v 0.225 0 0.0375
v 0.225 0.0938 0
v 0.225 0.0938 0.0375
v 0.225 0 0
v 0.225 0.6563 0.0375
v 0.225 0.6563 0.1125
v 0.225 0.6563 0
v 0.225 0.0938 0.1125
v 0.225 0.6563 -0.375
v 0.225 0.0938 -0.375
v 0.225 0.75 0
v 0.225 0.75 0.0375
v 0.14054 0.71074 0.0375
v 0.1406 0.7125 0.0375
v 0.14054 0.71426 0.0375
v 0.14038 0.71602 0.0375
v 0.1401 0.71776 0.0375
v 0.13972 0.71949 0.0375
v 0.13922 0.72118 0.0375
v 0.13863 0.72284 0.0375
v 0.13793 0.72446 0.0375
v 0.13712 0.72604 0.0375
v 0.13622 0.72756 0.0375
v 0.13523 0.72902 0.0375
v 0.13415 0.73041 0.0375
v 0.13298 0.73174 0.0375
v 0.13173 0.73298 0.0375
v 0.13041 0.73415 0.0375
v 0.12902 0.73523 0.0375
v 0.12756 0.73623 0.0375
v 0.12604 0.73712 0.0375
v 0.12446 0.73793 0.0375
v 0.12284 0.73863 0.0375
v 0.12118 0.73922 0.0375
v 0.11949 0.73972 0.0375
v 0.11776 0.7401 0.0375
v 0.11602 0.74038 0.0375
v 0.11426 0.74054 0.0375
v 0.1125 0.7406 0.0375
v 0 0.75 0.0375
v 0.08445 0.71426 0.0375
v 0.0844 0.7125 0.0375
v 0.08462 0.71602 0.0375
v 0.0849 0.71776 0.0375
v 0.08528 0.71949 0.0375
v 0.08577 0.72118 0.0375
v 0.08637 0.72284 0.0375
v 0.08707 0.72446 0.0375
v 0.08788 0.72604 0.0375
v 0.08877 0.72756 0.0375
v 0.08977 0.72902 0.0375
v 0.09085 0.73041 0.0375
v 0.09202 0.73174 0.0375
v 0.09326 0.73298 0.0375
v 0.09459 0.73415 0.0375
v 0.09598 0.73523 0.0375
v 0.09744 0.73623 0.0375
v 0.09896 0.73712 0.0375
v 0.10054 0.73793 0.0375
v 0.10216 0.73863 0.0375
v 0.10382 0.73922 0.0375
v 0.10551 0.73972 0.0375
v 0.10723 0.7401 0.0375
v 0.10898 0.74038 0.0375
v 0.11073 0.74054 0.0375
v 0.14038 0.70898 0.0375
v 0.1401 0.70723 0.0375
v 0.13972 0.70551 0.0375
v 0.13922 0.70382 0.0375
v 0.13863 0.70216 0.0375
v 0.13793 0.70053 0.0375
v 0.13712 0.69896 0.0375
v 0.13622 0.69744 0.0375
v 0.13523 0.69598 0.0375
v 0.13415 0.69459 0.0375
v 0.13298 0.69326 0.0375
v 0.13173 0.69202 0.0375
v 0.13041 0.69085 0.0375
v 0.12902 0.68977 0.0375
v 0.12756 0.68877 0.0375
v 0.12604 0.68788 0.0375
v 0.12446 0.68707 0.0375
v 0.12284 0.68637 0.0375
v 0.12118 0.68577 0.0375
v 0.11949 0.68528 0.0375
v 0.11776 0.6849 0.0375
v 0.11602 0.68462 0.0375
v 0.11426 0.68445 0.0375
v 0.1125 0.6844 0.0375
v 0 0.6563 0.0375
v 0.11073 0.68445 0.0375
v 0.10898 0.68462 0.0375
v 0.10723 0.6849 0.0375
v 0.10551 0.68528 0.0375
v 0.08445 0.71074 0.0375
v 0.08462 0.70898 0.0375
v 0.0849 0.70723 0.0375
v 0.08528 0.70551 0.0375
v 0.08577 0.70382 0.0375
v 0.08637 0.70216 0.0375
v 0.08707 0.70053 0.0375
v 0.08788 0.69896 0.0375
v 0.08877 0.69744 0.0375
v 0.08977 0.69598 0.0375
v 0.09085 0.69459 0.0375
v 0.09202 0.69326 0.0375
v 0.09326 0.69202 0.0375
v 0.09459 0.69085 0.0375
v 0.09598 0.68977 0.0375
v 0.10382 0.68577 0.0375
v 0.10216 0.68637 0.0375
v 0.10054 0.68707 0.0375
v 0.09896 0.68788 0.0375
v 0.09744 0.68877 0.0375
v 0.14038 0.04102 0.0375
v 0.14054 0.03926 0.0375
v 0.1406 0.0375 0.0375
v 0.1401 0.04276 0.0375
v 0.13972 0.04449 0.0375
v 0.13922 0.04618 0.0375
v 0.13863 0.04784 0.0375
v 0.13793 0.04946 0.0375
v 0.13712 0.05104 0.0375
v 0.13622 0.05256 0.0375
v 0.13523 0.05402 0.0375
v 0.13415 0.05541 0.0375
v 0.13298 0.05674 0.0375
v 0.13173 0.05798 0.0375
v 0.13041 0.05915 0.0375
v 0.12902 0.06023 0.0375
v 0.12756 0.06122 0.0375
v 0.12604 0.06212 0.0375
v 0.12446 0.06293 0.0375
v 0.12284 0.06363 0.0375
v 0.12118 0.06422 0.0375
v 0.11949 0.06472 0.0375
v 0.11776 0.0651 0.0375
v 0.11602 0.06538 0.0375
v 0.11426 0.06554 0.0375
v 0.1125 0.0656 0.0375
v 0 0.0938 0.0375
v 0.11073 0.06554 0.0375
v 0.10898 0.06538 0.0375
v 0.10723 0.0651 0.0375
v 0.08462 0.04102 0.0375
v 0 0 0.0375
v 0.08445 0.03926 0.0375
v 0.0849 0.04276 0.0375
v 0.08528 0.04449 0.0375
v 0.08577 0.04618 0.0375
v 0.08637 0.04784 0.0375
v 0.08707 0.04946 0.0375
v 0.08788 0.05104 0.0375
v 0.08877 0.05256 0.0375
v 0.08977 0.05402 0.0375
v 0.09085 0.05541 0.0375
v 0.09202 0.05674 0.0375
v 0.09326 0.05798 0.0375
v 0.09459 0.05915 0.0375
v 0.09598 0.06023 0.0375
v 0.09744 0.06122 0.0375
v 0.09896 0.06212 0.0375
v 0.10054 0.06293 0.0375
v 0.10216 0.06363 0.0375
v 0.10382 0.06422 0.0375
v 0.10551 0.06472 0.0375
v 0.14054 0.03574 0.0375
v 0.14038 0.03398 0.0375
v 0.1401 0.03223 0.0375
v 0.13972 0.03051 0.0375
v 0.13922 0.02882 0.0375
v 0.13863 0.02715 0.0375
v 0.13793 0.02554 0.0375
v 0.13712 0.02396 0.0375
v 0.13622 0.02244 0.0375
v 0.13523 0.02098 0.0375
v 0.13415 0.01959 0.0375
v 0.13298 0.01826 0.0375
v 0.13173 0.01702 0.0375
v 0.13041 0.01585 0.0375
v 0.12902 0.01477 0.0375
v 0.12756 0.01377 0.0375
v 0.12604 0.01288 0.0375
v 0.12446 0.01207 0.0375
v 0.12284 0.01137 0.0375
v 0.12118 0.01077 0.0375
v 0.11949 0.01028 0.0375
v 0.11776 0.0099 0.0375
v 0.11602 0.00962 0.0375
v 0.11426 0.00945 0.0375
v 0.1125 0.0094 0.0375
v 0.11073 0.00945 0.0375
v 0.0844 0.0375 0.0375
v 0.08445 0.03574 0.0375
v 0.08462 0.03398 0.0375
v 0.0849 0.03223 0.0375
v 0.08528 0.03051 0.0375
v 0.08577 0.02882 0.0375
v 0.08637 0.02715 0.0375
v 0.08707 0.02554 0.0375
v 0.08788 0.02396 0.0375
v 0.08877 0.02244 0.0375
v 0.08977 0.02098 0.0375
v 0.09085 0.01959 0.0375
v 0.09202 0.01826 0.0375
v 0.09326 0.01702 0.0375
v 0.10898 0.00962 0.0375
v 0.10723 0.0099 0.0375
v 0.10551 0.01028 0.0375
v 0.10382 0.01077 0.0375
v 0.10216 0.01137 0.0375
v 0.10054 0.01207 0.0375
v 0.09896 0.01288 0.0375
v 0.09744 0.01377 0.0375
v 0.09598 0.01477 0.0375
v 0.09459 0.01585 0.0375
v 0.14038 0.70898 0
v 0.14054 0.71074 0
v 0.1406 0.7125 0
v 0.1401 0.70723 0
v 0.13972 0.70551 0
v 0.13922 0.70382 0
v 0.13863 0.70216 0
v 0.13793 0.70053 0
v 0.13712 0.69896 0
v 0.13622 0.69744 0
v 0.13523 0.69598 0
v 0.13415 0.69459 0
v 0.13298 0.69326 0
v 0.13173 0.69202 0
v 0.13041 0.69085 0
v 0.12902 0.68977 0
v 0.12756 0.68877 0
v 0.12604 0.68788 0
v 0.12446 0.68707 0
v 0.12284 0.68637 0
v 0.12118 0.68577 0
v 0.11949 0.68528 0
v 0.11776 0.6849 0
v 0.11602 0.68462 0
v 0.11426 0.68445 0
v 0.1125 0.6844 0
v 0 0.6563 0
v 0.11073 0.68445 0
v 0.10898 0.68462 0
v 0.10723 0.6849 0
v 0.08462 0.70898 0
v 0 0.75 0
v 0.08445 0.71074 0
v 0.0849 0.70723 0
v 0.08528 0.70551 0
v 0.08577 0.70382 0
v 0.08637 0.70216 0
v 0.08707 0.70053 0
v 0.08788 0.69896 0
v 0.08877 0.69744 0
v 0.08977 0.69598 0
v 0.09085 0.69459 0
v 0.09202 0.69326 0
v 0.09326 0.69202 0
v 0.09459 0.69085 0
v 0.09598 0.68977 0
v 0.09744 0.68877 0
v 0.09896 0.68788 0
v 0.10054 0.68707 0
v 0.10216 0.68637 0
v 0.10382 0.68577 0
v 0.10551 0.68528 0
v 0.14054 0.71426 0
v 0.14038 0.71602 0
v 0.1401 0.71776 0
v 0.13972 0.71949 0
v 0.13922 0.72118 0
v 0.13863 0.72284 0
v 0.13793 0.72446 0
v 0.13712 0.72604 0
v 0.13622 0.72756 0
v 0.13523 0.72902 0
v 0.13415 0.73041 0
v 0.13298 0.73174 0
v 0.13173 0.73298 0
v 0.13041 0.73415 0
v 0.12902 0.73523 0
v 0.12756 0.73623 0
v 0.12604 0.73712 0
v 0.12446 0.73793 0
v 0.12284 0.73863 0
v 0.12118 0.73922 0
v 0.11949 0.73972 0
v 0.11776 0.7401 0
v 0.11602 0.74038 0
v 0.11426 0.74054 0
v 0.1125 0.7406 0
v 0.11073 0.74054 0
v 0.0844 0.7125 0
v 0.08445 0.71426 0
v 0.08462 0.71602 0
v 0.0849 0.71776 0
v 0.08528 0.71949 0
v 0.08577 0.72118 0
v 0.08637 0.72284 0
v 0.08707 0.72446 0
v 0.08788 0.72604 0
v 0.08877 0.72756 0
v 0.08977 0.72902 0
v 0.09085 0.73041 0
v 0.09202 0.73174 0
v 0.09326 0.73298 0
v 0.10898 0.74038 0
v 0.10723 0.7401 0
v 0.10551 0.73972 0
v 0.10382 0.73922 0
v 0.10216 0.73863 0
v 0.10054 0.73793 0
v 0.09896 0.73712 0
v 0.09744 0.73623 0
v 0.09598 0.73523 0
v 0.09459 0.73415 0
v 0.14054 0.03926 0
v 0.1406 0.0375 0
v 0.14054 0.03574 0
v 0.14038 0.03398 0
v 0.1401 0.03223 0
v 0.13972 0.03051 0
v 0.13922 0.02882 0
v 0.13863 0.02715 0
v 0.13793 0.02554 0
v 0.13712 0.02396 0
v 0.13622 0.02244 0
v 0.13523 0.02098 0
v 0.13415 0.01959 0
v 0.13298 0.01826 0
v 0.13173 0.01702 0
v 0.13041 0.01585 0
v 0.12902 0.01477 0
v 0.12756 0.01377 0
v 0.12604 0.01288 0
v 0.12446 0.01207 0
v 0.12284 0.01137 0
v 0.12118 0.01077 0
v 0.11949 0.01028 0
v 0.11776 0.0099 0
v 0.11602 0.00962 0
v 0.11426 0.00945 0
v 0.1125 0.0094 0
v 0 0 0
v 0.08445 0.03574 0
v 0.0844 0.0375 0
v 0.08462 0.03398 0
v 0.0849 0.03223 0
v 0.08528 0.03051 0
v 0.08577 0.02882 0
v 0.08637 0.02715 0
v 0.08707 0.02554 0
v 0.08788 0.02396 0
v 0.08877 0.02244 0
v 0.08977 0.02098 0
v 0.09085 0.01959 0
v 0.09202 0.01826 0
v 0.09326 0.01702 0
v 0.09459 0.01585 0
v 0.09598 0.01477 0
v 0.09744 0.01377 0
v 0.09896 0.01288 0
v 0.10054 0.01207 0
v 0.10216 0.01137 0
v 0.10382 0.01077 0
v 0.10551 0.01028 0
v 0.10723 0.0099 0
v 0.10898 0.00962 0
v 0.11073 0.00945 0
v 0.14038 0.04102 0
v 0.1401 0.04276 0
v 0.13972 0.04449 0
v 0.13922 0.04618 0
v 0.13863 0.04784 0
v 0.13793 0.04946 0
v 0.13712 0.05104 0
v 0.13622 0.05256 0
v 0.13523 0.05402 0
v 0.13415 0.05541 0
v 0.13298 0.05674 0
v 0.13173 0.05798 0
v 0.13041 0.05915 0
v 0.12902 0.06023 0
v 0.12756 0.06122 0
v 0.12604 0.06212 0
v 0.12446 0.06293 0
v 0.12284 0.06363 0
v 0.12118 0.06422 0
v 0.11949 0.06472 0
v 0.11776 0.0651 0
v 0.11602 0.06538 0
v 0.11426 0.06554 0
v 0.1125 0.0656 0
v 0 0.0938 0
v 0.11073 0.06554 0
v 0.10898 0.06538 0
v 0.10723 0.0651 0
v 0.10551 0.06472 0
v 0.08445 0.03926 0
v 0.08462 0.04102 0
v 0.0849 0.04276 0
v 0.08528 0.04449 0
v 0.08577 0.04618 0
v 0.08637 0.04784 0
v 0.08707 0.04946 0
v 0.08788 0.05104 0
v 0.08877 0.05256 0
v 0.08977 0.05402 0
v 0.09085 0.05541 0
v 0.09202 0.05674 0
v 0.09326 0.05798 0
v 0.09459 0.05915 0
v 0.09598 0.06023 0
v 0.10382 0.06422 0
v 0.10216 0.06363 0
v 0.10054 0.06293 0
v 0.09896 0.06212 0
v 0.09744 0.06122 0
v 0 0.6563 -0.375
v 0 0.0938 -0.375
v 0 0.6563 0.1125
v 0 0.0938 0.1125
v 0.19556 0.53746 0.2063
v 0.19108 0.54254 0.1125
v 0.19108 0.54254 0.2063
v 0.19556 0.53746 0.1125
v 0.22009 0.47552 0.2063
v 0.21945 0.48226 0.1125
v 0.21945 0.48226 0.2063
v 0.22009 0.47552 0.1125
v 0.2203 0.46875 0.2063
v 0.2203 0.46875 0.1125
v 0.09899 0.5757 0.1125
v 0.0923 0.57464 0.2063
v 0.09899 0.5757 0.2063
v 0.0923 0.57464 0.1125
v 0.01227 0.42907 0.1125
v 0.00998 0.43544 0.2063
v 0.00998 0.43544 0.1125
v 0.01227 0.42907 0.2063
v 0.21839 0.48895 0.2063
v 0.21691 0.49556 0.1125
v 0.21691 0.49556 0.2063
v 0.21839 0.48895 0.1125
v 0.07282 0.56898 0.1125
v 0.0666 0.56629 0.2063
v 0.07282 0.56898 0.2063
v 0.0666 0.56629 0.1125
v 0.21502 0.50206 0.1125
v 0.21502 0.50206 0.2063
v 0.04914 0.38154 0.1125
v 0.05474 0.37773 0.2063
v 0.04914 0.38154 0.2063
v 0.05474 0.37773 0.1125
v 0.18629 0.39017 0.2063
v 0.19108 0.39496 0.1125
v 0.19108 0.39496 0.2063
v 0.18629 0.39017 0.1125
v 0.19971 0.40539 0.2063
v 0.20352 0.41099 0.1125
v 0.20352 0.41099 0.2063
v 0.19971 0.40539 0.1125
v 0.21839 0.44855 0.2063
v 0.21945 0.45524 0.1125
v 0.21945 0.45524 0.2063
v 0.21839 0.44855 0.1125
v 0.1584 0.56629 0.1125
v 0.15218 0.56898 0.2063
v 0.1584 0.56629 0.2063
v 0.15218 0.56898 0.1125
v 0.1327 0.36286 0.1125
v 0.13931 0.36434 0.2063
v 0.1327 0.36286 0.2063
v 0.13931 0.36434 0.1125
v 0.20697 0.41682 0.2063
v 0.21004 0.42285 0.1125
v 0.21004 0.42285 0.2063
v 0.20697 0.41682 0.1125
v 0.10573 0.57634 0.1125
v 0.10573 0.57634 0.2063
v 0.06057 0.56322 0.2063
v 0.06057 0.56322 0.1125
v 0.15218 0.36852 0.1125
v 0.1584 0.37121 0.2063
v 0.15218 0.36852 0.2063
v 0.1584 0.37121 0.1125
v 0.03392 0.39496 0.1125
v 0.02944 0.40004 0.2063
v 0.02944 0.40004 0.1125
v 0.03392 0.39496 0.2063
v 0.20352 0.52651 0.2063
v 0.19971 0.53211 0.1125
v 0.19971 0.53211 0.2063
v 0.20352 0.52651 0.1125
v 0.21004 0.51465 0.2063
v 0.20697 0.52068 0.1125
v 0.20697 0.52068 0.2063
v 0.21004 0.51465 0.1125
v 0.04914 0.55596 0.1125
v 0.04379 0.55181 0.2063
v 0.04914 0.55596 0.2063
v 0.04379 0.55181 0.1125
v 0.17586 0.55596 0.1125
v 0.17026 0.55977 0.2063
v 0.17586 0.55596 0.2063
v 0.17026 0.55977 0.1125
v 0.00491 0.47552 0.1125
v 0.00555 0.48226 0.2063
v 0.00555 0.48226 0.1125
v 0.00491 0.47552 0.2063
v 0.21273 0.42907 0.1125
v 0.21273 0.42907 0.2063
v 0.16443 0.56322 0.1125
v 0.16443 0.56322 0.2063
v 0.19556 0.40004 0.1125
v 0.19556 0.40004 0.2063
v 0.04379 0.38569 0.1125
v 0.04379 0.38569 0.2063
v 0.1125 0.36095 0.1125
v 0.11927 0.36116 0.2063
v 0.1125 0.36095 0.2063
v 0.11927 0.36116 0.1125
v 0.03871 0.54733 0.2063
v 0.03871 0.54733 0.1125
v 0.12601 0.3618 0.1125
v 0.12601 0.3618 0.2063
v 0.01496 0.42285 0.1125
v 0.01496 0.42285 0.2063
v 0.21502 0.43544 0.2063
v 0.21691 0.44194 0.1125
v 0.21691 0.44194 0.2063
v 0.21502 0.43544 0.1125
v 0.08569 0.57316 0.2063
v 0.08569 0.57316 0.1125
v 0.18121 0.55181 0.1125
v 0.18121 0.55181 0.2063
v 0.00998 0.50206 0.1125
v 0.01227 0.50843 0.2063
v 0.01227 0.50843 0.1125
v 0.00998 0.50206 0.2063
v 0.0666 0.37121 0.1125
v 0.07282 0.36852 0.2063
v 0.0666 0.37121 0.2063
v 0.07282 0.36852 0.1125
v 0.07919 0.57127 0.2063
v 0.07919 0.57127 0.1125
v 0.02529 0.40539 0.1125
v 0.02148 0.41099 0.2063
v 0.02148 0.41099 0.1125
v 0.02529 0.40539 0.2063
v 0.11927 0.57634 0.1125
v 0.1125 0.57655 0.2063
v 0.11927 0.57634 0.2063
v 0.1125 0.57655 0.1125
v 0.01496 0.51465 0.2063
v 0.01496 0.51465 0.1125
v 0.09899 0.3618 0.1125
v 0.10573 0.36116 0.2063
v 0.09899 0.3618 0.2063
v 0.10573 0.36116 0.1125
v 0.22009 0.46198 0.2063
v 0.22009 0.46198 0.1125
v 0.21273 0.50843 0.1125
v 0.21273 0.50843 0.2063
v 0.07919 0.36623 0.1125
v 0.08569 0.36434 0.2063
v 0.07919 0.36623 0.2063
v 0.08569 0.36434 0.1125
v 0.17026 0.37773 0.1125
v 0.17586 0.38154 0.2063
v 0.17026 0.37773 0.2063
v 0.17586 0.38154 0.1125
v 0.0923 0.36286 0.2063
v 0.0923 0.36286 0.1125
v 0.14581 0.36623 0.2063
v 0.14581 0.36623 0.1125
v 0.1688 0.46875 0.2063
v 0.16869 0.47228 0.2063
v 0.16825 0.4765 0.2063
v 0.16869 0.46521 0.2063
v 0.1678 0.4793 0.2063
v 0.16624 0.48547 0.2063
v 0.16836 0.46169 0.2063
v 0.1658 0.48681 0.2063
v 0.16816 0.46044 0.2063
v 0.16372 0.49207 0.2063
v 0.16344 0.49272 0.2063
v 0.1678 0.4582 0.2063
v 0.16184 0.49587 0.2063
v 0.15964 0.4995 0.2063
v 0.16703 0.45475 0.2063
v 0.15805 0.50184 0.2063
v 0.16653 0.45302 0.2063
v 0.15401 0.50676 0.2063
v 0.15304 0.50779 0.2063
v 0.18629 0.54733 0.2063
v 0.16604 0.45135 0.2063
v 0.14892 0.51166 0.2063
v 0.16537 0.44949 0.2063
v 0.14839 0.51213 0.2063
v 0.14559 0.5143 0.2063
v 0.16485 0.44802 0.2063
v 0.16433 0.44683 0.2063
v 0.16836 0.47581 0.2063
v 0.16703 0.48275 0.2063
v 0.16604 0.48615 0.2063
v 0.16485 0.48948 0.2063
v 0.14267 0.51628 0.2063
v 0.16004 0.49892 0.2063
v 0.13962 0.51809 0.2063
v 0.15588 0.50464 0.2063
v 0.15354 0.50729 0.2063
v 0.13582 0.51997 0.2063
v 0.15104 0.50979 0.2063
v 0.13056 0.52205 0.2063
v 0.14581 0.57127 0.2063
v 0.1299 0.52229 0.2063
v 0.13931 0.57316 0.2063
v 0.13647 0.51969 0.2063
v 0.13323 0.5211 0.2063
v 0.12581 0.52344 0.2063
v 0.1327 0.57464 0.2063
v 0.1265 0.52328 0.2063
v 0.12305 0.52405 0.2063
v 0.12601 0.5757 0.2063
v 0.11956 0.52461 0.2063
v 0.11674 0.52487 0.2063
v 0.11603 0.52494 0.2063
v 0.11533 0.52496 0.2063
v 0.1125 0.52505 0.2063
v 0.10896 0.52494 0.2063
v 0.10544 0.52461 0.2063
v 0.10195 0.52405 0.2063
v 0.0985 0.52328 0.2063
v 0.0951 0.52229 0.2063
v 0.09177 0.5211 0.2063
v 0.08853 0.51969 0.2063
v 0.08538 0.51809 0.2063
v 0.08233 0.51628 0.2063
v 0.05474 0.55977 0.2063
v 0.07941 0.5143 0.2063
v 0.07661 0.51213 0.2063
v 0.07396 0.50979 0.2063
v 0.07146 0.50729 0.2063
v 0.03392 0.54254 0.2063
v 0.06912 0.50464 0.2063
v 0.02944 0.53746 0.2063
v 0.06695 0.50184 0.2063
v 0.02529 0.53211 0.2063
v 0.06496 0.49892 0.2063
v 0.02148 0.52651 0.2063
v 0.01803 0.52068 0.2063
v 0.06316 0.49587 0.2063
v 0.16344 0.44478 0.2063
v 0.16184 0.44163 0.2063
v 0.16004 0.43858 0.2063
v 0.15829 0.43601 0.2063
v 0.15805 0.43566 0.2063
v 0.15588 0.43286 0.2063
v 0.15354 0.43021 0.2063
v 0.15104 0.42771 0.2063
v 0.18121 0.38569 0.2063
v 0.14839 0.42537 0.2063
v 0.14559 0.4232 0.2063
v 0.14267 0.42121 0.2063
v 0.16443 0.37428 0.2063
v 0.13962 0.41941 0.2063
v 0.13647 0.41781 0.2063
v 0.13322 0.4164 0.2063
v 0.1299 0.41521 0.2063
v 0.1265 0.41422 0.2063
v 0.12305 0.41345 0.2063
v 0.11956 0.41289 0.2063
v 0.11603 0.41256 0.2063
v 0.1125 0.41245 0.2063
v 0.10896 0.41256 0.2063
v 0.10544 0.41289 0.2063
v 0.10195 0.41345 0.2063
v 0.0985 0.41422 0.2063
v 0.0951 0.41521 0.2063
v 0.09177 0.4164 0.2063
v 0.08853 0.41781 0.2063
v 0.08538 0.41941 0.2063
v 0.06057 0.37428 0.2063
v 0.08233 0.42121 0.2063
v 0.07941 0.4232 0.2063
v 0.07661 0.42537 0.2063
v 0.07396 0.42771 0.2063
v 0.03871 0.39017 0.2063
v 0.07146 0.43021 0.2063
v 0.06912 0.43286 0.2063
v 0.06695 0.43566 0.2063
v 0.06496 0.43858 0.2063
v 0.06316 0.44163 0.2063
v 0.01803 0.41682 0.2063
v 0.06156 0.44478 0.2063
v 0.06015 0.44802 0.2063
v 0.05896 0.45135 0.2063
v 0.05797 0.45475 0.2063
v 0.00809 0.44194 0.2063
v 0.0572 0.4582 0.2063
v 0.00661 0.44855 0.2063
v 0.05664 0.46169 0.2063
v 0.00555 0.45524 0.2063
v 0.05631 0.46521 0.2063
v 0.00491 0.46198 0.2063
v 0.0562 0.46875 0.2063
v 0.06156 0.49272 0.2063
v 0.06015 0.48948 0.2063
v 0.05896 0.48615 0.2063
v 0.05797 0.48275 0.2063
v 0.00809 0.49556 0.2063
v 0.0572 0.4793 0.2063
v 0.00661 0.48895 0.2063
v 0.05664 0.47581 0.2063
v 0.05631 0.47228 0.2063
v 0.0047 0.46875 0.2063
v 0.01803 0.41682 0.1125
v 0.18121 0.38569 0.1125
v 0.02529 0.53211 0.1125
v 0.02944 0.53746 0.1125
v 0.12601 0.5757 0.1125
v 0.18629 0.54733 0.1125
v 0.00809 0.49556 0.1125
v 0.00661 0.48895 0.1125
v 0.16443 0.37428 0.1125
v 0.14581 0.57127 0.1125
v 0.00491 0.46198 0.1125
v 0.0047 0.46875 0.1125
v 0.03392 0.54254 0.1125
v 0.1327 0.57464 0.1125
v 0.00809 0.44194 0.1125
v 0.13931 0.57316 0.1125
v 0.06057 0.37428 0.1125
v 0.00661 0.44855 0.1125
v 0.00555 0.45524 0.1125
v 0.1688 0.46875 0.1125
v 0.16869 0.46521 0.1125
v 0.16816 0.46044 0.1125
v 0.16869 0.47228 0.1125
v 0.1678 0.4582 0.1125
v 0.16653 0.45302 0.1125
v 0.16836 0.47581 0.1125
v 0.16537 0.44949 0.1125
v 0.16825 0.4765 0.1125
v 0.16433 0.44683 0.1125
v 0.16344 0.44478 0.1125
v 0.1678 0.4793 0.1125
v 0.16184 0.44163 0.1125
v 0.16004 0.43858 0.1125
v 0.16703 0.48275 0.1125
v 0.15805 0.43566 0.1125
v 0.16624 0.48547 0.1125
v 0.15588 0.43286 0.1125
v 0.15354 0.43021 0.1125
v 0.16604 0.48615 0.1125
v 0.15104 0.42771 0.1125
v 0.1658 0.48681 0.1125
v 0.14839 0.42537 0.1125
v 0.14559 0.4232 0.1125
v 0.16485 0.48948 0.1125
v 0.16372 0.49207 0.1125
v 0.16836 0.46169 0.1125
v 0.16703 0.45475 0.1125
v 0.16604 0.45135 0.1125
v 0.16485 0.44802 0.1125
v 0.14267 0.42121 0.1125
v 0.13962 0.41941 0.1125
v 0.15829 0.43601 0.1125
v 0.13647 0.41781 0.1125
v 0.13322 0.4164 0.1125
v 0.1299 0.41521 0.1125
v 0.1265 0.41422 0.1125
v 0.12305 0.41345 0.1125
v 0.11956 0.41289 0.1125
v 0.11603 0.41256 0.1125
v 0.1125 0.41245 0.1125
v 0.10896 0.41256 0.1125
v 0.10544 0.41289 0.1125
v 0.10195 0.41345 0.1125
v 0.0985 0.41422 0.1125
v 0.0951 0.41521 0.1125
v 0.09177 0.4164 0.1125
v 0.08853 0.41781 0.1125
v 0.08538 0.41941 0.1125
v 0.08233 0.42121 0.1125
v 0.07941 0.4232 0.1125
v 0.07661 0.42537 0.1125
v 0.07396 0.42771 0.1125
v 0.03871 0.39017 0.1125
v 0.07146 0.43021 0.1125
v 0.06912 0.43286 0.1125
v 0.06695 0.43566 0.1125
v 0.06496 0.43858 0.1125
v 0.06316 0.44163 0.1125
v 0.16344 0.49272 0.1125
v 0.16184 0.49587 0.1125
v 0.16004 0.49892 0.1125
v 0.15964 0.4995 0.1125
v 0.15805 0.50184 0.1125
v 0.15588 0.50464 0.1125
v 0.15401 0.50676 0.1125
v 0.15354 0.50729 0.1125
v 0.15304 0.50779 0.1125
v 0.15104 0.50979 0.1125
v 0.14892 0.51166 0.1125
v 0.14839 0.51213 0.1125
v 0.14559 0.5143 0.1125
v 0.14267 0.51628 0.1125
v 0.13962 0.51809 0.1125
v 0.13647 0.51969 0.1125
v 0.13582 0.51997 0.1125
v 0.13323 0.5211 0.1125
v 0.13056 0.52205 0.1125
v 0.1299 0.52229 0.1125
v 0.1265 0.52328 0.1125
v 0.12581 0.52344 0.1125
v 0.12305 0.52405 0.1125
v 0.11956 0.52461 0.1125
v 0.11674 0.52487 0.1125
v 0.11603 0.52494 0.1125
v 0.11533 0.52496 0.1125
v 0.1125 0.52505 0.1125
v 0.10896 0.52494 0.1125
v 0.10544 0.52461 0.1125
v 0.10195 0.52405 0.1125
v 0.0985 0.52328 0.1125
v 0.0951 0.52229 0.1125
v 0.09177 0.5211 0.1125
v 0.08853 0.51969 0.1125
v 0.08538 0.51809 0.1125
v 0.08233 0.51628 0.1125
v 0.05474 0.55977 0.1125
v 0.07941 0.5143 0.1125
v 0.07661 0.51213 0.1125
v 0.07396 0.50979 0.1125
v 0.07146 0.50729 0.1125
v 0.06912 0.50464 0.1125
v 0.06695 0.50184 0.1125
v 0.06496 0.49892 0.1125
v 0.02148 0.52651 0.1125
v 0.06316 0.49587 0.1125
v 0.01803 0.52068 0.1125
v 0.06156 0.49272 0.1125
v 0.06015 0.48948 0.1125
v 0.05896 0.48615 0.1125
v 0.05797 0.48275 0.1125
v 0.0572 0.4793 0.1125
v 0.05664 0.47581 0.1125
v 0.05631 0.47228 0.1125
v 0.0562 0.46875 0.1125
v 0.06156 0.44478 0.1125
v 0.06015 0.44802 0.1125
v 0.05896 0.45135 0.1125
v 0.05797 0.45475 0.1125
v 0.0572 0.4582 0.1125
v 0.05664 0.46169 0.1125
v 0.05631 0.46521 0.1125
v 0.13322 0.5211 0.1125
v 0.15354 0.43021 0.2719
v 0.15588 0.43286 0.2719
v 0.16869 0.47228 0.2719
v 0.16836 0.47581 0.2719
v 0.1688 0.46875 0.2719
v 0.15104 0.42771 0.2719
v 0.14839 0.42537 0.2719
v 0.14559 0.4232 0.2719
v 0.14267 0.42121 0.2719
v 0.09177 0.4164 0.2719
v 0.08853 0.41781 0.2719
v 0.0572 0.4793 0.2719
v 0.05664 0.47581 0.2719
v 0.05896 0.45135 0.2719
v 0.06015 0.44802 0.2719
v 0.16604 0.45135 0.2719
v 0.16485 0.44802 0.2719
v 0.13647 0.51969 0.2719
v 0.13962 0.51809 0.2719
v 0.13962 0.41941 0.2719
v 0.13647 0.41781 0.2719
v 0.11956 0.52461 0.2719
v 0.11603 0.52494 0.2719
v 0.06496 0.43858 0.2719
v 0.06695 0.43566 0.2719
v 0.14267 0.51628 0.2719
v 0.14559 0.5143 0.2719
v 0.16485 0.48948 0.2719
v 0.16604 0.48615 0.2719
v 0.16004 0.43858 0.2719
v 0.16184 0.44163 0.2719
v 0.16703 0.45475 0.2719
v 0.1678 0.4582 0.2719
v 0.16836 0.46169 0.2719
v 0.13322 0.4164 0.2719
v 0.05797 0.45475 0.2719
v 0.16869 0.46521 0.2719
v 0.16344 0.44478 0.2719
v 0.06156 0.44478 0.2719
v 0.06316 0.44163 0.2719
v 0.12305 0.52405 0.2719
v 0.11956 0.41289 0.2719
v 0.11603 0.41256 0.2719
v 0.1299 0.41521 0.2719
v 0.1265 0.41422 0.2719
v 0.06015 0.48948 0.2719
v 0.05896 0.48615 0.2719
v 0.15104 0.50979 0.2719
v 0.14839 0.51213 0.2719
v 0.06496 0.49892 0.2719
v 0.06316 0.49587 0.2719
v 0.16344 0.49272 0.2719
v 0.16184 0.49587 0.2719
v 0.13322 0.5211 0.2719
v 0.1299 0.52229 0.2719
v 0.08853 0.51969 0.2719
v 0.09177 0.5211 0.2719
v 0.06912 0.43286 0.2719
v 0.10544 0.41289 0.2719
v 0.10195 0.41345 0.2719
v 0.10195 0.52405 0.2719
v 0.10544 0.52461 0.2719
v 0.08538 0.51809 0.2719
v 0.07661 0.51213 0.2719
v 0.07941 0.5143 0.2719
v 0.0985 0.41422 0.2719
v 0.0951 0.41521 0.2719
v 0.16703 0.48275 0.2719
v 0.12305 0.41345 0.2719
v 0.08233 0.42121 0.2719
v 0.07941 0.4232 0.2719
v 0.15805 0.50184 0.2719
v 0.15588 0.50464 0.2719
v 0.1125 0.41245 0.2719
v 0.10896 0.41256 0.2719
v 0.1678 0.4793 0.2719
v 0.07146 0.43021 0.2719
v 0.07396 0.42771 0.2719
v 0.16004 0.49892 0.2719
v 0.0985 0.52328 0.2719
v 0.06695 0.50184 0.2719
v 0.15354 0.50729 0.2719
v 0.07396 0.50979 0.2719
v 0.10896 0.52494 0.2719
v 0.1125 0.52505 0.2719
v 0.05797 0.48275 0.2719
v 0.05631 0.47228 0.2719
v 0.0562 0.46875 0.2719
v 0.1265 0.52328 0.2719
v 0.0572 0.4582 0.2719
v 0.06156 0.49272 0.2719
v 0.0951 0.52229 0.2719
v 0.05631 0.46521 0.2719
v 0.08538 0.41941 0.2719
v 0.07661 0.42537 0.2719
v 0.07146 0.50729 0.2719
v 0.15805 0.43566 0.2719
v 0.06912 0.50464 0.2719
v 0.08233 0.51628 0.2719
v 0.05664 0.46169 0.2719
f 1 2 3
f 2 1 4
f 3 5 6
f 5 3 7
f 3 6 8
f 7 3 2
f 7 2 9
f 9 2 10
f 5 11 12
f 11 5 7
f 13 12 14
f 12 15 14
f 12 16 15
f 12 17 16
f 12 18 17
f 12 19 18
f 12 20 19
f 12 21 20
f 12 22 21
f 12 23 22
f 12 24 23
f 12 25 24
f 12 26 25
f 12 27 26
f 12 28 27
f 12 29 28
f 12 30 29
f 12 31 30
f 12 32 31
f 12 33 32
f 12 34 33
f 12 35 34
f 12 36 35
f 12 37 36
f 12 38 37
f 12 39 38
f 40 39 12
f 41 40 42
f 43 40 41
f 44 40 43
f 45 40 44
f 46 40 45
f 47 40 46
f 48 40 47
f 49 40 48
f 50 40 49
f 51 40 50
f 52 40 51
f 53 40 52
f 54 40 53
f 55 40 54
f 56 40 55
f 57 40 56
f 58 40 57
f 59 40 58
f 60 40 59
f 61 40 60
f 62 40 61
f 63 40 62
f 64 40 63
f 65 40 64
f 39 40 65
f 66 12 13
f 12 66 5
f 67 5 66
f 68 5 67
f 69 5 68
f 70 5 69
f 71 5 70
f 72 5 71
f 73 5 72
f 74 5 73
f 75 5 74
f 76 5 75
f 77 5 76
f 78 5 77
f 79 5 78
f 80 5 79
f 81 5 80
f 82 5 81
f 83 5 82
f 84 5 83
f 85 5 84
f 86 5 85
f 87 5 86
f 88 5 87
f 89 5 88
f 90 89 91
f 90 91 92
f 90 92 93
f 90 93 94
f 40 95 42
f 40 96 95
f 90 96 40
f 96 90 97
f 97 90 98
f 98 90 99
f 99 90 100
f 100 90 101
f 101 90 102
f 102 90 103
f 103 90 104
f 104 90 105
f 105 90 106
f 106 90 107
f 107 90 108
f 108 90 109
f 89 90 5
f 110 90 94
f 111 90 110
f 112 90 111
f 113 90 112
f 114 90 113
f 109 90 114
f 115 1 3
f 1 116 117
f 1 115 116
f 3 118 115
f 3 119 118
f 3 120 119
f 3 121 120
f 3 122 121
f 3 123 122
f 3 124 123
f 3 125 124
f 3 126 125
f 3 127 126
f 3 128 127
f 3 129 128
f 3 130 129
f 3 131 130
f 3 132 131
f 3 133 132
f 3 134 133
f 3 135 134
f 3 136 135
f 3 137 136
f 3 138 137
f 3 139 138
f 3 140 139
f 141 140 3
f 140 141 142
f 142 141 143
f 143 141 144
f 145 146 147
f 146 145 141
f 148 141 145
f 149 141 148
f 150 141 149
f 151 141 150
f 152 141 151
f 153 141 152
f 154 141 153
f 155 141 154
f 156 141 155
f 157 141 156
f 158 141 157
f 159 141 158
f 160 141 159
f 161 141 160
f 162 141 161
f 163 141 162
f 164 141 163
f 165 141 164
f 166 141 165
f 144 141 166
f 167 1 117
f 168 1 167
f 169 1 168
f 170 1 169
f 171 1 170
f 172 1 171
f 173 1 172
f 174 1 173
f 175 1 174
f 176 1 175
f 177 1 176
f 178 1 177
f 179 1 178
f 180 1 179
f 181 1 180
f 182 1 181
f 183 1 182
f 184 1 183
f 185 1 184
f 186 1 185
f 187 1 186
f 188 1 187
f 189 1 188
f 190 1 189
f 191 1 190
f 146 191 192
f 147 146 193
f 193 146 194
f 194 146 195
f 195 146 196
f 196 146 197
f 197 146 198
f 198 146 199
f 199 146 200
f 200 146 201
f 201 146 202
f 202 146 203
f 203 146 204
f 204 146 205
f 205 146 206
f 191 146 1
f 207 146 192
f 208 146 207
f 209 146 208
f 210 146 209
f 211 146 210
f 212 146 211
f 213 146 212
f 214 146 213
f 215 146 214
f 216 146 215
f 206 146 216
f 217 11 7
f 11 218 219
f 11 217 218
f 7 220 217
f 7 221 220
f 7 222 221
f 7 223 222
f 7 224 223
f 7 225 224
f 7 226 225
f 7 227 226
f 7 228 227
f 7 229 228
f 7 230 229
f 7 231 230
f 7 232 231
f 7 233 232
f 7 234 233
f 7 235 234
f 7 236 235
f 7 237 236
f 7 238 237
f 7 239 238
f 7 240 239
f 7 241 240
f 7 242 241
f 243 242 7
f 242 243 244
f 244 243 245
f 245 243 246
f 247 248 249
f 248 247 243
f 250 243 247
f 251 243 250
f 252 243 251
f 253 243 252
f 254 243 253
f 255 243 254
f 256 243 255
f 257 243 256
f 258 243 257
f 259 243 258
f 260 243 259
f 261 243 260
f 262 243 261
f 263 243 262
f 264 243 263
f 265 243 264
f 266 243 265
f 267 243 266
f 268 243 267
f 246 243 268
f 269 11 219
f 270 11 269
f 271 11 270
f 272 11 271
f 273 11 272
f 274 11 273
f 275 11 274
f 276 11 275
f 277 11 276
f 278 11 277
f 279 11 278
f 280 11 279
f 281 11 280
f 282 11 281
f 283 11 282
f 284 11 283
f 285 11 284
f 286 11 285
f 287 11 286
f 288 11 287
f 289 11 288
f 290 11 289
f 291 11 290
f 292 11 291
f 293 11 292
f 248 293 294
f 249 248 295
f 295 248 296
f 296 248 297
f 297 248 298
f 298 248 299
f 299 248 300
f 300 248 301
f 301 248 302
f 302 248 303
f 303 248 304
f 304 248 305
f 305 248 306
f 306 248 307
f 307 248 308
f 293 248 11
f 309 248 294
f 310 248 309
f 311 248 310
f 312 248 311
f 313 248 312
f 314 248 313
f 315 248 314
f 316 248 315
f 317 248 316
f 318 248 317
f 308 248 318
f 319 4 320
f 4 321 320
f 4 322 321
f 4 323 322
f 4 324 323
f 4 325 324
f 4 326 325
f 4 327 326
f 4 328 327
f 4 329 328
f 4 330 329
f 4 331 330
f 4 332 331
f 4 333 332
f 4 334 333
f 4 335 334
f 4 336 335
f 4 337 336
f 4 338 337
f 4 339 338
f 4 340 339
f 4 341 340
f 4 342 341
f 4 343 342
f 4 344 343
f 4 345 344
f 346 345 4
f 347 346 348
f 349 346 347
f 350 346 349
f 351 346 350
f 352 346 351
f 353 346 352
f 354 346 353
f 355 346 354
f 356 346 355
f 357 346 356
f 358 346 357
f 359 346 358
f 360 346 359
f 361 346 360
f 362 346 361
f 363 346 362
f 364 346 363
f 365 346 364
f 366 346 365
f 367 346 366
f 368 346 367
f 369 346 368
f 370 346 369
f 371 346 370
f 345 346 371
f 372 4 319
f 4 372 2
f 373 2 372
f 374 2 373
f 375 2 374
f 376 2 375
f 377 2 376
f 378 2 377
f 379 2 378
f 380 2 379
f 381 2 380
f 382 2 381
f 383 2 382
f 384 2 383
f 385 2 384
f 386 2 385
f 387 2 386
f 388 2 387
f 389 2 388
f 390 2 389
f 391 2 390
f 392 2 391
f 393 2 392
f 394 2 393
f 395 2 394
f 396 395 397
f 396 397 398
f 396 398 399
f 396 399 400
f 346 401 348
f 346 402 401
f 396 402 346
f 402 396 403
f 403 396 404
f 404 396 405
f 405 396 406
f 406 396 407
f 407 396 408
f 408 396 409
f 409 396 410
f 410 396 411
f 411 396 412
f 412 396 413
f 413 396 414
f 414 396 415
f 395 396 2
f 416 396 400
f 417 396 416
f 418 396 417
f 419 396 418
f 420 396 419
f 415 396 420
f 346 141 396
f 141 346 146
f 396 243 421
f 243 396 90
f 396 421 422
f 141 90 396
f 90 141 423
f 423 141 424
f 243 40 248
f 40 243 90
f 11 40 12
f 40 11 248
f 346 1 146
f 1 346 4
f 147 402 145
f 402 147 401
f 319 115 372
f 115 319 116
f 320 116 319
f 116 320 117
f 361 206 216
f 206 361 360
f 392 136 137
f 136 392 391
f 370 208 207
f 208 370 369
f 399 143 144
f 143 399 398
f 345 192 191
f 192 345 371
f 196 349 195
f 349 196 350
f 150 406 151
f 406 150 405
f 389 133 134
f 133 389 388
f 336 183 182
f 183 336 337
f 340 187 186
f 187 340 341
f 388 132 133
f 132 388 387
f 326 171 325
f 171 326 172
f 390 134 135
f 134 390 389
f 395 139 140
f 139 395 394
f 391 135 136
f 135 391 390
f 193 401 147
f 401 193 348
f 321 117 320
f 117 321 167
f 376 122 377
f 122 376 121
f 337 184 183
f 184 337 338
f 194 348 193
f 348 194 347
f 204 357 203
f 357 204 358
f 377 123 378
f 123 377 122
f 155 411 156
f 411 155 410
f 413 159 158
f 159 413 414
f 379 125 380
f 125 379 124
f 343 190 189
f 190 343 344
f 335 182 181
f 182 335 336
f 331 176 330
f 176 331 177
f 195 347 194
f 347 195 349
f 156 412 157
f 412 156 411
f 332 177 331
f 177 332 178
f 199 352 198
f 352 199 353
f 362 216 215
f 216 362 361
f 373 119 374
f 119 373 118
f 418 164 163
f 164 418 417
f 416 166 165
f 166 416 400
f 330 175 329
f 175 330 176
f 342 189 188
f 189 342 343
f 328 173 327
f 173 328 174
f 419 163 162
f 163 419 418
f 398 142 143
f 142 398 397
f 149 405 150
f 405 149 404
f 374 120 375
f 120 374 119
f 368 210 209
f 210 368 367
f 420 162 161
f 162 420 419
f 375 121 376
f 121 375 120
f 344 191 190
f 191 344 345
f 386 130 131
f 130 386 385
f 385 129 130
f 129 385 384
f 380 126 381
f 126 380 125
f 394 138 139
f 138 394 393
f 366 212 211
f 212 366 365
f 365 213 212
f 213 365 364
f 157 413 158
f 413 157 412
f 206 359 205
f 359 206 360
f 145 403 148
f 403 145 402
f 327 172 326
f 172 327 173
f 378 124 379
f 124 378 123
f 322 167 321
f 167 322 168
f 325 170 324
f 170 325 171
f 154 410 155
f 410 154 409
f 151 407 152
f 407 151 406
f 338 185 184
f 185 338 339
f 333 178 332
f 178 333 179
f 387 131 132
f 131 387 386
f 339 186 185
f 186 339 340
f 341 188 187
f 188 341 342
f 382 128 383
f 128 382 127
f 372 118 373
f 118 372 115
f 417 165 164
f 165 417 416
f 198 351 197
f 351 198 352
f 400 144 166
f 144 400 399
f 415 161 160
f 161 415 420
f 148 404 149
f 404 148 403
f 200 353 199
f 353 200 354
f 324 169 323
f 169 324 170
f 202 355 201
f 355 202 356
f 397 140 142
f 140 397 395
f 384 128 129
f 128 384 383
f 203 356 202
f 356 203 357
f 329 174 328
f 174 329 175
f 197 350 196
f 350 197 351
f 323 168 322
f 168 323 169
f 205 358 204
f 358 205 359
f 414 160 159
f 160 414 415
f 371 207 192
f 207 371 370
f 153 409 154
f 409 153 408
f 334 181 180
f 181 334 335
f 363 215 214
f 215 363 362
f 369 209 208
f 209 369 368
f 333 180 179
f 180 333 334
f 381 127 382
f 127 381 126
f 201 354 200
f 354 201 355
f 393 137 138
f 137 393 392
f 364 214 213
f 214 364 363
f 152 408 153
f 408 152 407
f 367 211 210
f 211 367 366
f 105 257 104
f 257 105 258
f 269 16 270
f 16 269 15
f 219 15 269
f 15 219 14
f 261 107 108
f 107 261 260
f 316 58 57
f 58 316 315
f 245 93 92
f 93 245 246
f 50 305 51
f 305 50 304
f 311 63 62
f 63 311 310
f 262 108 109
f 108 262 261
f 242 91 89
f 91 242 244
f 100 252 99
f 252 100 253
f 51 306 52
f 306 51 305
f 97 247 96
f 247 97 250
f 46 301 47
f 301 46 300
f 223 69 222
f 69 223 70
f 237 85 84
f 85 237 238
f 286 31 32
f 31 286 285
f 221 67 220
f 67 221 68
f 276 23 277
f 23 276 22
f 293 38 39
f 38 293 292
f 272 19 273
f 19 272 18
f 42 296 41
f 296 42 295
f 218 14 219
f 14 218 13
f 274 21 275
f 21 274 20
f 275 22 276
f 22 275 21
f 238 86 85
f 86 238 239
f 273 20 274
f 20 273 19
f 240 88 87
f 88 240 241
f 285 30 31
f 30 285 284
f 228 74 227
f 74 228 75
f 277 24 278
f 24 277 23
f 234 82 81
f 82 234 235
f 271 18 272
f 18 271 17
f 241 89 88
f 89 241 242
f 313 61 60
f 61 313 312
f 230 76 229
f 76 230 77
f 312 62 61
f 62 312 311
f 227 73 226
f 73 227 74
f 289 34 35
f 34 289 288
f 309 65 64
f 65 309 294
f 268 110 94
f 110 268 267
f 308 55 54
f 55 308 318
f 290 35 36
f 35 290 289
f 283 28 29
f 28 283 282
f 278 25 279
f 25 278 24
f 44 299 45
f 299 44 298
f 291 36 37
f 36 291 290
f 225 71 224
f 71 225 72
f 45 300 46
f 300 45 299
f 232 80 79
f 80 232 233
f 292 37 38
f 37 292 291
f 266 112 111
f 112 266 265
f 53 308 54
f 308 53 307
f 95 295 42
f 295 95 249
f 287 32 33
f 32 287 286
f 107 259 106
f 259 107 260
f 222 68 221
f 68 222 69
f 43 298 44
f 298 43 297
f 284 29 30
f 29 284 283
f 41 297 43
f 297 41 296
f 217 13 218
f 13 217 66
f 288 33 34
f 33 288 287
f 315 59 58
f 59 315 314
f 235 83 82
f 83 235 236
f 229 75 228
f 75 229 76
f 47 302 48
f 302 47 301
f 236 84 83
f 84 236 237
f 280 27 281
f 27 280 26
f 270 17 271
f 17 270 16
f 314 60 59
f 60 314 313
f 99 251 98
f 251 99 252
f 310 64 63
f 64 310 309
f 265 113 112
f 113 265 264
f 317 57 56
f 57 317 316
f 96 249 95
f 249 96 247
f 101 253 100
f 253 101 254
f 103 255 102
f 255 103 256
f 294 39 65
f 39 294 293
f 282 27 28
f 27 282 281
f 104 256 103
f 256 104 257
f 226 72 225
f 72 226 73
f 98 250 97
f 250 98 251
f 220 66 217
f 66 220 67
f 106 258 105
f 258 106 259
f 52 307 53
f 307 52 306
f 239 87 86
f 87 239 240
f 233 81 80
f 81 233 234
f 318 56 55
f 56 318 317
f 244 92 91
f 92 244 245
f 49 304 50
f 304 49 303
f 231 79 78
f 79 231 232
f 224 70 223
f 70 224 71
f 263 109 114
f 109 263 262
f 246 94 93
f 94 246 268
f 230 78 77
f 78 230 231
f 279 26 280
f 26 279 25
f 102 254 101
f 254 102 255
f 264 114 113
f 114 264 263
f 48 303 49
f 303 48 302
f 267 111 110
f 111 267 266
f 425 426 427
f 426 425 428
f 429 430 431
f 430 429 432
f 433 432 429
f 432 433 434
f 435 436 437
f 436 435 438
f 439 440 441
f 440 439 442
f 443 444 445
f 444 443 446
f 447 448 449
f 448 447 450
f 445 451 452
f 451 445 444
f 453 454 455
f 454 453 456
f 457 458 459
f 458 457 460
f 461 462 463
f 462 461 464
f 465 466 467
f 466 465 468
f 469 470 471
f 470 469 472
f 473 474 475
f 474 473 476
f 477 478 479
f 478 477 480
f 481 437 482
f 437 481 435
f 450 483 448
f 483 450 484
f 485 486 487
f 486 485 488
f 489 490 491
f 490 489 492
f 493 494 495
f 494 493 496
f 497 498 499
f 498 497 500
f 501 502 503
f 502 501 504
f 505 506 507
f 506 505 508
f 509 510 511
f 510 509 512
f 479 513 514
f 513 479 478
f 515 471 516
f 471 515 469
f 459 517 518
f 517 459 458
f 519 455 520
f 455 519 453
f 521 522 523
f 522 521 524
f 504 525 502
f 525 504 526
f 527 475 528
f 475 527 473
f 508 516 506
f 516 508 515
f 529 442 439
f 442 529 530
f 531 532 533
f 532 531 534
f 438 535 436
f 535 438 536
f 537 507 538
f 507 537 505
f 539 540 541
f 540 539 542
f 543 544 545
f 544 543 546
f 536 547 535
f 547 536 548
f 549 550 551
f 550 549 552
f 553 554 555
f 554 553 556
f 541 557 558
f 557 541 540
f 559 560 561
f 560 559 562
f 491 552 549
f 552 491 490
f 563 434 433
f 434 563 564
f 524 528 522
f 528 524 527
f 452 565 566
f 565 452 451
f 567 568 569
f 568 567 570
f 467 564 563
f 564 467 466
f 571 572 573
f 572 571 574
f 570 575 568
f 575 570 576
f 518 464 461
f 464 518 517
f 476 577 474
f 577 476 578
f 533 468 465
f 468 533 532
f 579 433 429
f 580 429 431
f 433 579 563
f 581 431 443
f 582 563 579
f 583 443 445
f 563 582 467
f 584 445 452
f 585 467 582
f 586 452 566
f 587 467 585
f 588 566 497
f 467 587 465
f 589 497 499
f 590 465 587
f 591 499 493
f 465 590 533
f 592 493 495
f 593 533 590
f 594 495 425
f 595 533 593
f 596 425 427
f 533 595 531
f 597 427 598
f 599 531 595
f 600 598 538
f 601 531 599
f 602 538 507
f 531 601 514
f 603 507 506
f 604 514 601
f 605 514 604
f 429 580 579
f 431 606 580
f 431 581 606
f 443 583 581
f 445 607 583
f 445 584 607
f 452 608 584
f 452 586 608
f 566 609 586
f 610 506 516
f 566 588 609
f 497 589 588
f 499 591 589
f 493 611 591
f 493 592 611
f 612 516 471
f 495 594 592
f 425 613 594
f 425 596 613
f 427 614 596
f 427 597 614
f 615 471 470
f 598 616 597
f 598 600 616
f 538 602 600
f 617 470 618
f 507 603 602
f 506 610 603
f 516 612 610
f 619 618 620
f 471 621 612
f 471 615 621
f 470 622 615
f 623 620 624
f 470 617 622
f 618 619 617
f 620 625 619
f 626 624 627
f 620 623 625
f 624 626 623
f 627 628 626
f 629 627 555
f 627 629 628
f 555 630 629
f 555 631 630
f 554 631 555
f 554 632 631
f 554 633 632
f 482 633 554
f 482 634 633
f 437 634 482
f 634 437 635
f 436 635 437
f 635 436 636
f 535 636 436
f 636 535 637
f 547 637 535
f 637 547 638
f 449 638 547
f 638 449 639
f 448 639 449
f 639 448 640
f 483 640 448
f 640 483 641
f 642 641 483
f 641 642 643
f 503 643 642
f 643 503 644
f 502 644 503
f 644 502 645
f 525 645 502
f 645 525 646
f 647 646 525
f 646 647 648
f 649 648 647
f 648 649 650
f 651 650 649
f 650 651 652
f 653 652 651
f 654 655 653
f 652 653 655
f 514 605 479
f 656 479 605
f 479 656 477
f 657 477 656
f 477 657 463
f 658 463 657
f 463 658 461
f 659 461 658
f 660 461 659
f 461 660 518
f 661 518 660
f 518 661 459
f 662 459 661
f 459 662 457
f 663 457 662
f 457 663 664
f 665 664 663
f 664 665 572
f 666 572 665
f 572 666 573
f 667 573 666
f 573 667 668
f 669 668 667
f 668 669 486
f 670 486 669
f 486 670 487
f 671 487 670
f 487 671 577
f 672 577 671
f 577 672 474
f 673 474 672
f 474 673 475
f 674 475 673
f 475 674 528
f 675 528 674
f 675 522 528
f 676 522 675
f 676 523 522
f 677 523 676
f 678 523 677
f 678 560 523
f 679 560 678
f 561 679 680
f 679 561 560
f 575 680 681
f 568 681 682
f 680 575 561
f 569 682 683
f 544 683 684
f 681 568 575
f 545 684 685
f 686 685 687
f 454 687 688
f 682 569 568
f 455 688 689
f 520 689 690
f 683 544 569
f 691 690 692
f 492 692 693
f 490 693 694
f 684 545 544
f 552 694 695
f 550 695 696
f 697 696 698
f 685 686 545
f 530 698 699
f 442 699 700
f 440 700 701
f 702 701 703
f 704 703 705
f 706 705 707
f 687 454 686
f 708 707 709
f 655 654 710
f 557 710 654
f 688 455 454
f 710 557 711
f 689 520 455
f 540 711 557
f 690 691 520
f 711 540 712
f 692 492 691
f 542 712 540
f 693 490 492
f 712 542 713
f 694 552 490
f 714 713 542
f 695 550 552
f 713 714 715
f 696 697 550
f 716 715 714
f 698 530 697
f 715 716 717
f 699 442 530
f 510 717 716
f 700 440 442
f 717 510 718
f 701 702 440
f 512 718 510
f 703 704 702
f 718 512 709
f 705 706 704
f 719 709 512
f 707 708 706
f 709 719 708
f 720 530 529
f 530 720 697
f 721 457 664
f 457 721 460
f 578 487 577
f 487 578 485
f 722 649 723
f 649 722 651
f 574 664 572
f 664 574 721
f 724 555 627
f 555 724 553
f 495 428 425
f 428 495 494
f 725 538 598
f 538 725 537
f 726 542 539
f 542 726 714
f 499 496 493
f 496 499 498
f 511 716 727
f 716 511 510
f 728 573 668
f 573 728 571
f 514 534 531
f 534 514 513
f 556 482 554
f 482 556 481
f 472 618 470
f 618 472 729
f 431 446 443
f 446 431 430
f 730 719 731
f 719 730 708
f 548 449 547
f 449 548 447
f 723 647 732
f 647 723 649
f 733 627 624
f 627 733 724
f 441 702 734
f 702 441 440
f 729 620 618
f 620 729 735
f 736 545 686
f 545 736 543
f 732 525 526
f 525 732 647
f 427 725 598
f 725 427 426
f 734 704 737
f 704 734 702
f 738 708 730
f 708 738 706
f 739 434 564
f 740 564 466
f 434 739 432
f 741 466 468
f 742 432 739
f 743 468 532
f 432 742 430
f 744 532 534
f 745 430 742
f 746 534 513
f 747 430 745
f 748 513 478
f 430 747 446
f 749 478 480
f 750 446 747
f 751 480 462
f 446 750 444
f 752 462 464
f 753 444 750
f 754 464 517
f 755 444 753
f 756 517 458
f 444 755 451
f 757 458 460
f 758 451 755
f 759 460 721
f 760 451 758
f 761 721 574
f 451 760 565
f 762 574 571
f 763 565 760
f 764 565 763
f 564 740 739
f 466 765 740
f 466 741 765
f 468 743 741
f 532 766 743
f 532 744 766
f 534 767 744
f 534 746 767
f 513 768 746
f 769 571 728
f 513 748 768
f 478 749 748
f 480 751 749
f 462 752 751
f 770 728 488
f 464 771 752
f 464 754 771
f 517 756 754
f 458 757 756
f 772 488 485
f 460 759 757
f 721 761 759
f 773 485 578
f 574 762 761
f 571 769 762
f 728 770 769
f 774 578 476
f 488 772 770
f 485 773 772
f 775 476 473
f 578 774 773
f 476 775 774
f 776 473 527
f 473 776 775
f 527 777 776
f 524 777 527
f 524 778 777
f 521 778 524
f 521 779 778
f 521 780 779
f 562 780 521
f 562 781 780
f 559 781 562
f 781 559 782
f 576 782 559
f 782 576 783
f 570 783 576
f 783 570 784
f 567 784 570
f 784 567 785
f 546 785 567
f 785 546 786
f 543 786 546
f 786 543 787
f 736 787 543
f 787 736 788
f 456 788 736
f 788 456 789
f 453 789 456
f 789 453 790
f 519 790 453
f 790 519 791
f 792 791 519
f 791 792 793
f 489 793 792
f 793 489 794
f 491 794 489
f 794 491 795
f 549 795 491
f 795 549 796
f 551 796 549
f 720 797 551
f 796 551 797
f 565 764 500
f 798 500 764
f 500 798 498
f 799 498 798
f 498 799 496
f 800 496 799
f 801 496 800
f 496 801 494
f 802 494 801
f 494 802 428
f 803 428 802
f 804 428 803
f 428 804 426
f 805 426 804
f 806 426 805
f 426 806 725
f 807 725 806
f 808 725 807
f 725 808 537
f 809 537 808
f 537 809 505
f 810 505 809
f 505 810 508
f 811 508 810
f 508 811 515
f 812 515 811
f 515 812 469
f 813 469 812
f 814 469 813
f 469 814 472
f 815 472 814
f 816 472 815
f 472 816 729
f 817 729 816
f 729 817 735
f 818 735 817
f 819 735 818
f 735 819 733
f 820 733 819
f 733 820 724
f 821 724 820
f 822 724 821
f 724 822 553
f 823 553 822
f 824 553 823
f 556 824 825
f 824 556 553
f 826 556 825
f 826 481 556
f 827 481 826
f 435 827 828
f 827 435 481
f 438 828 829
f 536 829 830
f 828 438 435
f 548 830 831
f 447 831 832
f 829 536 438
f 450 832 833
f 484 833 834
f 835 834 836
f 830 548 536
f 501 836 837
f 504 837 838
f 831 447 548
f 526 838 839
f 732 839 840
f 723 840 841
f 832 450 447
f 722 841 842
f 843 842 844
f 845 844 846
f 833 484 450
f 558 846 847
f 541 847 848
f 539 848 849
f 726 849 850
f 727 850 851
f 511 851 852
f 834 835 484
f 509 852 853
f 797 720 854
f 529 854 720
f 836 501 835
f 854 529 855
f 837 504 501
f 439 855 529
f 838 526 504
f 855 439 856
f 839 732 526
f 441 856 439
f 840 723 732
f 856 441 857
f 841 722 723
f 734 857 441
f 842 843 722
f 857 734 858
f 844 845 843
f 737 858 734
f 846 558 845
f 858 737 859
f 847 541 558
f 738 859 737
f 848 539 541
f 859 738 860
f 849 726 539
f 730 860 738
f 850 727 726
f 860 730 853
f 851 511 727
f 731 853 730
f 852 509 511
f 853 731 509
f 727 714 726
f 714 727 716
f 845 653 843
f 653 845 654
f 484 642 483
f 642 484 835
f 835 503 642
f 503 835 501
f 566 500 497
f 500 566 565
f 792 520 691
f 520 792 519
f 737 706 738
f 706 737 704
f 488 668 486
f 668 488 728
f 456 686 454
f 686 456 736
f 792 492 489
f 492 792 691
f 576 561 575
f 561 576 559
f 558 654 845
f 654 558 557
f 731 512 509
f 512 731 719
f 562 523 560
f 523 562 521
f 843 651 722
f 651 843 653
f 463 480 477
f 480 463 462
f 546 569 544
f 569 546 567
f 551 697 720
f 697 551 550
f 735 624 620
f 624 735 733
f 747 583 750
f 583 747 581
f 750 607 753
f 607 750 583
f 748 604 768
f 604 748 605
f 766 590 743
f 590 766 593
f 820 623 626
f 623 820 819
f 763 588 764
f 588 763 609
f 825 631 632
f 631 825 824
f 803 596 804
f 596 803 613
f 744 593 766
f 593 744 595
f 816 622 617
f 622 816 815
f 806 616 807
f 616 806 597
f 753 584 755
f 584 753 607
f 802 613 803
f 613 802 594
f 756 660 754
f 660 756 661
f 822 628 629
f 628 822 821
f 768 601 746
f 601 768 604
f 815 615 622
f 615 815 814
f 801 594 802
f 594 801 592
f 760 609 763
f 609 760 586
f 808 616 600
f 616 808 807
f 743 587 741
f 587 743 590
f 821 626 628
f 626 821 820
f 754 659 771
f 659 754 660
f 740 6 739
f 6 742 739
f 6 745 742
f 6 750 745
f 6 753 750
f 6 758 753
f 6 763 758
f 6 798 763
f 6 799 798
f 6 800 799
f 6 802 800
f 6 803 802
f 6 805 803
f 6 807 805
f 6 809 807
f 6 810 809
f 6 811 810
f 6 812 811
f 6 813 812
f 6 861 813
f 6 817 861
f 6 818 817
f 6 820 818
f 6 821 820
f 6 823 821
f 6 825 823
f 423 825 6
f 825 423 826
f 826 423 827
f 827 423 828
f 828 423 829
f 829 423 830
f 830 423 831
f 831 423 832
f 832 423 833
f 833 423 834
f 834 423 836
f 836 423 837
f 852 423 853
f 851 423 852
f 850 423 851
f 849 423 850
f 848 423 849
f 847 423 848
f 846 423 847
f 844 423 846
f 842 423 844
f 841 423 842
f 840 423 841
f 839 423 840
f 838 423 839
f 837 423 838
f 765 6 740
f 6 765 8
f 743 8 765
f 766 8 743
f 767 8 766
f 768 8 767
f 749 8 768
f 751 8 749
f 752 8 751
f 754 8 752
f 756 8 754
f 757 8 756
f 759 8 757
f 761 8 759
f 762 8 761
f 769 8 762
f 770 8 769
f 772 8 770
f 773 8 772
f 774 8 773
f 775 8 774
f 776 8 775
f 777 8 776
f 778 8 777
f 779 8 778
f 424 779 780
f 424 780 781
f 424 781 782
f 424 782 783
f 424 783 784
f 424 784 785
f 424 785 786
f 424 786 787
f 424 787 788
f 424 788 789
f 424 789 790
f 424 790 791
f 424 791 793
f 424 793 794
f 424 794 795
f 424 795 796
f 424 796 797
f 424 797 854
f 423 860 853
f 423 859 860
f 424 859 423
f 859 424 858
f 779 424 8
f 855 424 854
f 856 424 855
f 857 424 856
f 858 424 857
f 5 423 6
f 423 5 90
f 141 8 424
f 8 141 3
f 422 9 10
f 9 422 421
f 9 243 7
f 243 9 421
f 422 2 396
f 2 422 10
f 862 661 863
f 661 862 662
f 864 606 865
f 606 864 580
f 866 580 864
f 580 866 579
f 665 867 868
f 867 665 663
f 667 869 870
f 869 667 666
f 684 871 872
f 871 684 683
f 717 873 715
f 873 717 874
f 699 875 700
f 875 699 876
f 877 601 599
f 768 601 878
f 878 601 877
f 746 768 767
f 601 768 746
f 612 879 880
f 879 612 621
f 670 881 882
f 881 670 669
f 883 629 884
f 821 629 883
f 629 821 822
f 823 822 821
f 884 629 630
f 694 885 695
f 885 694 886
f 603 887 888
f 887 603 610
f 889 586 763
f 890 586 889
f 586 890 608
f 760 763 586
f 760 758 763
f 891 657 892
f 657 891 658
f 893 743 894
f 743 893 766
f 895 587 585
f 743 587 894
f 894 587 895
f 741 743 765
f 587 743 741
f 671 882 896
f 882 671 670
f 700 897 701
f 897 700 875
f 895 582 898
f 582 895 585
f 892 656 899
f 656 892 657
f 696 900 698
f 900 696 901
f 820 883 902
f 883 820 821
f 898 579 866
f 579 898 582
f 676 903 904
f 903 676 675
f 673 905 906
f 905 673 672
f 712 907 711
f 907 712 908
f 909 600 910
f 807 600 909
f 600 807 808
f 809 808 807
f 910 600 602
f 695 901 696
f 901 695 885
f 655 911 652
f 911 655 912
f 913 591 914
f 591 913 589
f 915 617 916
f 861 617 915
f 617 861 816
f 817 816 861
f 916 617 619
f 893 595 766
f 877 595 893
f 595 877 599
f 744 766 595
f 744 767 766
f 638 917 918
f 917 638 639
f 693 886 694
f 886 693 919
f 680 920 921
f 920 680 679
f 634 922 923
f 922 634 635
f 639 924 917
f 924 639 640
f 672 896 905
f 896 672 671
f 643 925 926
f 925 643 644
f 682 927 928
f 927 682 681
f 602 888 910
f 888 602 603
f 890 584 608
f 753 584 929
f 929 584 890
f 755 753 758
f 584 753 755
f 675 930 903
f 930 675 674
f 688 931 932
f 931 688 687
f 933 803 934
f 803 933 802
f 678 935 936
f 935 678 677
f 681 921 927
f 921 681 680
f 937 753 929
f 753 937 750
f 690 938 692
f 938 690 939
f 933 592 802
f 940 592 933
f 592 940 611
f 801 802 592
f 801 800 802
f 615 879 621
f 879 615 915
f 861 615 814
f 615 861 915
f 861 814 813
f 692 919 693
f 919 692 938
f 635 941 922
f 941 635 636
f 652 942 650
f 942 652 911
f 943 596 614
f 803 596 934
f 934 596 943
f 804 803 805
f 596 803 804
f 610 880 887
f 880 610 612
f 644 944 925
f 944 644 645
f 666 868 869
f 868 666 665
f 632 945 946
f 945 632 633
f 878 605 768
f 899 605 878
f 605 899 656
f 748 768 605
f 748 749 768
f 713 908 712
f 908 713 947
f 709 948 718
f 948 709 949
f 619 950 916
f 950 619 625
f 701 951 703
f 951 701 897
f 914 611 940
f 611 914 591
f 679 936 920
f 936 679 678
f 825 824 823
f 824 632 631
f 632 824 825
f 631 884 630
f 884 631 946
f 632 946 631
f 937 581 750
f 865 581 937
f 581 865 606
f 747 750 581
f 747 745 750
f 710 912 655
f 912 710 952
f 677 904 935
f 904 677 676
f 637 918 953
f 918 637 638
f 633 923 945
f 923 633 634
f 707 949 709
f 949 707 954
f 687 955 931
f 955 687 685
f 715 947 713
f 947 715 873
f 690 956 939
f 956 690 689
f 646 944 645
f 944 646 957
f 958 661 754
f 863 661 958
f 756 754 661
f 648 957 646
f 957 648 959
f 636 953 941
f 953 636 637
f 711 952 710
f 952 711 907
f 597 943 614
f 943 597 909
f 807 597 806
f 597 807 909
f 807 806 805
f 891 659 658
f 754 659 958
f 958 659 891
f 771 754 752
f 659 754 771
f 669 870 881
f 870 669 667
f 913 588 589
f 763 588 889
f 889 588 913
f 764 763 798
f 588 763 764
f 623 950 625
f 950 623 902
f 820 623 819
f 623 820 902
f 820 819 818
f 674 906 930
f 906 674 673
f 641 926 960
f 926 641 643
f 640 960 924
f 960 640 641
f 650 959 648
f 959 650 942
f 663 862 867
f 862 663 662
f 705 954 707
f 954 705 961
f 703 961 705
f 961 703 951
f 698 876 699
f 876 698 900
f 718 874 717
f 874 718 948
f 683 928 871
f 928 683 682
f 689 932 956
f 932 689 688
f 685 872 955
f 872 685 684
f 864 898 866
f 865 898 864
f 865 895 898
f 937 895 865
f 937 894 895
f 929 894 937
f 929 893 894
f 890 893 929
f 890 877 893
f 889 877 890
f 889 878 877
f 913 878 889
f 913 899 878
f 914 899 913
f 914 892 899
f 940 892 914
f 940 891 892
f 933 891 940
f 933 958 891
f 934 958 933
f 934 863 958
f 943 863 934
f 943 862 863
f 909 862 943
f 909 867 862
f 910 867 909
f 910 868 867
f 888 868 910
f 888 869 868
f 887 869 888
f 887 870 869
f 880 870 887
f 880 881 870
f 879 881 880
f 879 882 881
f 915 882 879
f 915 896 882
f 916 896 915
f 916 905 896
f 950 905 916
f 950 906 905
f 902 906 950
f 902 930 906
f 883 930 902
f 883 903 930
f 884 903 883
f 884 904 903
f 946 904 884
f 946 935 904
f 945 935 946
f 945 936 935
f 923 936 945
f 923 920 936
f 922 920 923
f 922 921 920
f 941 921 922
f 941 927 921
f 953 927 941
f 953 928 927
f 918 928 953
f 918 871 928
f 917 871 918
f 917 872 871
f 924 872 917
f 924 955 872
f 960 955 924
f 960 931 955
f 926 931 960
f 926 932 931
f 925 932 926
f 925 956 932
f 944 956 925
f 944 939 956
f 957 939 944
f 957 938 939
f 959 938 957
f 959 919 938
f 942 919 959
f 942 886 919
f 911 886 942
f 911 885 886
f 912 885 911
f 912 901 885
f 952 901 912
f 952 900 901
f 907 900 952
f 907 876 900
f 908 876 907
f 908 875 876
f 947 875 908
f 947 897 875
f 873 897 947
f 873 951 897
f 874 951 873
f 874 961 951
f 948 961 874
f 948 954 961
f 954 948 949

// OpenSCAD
// Resolution for curved features
$fn = 100;

// Main plate dimensions
plate_length = 0.225;
plate_width = 0.75;
plate_thickness = 0.0375;

// Through-hole parameters
hole_radius = 0.0281;
hole_center_x = 0.1125;
hole1_y = 0.0375;
hole2_y = 0.7125;

// Central upper rectangular solid
upper_width = 0.5625;
upper_front_offset = 0.0938;
upper_back_offset = 0.0937;
upper_top_z = 0.1125;

// Central lower rectangular solid
lower_depth = 0.375;

// Stepped boss parameters
boss_x = 0.1125;
boss_y = 0.46875;
boss_outer_r = 0.1078;
boss_inner_r = 0.0563;
boss_height = 0.0938;

// Upper solid pin parameters
pin_r = 0.0563;
pin_height = 0.1594;

// Derived dimensions
upper_y_start = upper_front_offset;
upper_y_span = plate_width - upper_front_offset - upper_back_offset;
upper_height = upper_top_z - plate_thickness;
lower_z = -lower_depth;

// Model assembly
union() {
    // Base plate with two through holes
    difference() {
        cube([plate_length, plate_width, plate_thickness]);

        translate([hole_center_x, hole1_y, -0.001])
            cylinder(h = plate_thickness + 0.002, r = hole_radius);

        translate([hole_center_x, hole2_y, -0.001])
            cylinder(h = plate_thickness + 0.002, r = hole_radius);
    }

    // Upper central shoulder
    translate([0, upper_y_start, plate_thickness])
        cube([plate_length, upper_y_span, upper_height]);

    // Lower central solid
    translate([0, upper_y_start, lower_z])
        cube([plate_length, upper_y_span, lower_depth]);

    // Annular collar
    translate([boss_x, boss_y, upper_top_z])
        difference() {
            cylinder(h = boss_height, r = boss_outer_r);
            translate([0, 0, -0.001])
                cylinder(h = boss_height + 0.002, r = boss_inner_r);
        }

    // Solid pin on same axis
    translate([boss_x, boss_y, upper_top_z])
        cylinder(h = pin_height, r = pin_r);
}
